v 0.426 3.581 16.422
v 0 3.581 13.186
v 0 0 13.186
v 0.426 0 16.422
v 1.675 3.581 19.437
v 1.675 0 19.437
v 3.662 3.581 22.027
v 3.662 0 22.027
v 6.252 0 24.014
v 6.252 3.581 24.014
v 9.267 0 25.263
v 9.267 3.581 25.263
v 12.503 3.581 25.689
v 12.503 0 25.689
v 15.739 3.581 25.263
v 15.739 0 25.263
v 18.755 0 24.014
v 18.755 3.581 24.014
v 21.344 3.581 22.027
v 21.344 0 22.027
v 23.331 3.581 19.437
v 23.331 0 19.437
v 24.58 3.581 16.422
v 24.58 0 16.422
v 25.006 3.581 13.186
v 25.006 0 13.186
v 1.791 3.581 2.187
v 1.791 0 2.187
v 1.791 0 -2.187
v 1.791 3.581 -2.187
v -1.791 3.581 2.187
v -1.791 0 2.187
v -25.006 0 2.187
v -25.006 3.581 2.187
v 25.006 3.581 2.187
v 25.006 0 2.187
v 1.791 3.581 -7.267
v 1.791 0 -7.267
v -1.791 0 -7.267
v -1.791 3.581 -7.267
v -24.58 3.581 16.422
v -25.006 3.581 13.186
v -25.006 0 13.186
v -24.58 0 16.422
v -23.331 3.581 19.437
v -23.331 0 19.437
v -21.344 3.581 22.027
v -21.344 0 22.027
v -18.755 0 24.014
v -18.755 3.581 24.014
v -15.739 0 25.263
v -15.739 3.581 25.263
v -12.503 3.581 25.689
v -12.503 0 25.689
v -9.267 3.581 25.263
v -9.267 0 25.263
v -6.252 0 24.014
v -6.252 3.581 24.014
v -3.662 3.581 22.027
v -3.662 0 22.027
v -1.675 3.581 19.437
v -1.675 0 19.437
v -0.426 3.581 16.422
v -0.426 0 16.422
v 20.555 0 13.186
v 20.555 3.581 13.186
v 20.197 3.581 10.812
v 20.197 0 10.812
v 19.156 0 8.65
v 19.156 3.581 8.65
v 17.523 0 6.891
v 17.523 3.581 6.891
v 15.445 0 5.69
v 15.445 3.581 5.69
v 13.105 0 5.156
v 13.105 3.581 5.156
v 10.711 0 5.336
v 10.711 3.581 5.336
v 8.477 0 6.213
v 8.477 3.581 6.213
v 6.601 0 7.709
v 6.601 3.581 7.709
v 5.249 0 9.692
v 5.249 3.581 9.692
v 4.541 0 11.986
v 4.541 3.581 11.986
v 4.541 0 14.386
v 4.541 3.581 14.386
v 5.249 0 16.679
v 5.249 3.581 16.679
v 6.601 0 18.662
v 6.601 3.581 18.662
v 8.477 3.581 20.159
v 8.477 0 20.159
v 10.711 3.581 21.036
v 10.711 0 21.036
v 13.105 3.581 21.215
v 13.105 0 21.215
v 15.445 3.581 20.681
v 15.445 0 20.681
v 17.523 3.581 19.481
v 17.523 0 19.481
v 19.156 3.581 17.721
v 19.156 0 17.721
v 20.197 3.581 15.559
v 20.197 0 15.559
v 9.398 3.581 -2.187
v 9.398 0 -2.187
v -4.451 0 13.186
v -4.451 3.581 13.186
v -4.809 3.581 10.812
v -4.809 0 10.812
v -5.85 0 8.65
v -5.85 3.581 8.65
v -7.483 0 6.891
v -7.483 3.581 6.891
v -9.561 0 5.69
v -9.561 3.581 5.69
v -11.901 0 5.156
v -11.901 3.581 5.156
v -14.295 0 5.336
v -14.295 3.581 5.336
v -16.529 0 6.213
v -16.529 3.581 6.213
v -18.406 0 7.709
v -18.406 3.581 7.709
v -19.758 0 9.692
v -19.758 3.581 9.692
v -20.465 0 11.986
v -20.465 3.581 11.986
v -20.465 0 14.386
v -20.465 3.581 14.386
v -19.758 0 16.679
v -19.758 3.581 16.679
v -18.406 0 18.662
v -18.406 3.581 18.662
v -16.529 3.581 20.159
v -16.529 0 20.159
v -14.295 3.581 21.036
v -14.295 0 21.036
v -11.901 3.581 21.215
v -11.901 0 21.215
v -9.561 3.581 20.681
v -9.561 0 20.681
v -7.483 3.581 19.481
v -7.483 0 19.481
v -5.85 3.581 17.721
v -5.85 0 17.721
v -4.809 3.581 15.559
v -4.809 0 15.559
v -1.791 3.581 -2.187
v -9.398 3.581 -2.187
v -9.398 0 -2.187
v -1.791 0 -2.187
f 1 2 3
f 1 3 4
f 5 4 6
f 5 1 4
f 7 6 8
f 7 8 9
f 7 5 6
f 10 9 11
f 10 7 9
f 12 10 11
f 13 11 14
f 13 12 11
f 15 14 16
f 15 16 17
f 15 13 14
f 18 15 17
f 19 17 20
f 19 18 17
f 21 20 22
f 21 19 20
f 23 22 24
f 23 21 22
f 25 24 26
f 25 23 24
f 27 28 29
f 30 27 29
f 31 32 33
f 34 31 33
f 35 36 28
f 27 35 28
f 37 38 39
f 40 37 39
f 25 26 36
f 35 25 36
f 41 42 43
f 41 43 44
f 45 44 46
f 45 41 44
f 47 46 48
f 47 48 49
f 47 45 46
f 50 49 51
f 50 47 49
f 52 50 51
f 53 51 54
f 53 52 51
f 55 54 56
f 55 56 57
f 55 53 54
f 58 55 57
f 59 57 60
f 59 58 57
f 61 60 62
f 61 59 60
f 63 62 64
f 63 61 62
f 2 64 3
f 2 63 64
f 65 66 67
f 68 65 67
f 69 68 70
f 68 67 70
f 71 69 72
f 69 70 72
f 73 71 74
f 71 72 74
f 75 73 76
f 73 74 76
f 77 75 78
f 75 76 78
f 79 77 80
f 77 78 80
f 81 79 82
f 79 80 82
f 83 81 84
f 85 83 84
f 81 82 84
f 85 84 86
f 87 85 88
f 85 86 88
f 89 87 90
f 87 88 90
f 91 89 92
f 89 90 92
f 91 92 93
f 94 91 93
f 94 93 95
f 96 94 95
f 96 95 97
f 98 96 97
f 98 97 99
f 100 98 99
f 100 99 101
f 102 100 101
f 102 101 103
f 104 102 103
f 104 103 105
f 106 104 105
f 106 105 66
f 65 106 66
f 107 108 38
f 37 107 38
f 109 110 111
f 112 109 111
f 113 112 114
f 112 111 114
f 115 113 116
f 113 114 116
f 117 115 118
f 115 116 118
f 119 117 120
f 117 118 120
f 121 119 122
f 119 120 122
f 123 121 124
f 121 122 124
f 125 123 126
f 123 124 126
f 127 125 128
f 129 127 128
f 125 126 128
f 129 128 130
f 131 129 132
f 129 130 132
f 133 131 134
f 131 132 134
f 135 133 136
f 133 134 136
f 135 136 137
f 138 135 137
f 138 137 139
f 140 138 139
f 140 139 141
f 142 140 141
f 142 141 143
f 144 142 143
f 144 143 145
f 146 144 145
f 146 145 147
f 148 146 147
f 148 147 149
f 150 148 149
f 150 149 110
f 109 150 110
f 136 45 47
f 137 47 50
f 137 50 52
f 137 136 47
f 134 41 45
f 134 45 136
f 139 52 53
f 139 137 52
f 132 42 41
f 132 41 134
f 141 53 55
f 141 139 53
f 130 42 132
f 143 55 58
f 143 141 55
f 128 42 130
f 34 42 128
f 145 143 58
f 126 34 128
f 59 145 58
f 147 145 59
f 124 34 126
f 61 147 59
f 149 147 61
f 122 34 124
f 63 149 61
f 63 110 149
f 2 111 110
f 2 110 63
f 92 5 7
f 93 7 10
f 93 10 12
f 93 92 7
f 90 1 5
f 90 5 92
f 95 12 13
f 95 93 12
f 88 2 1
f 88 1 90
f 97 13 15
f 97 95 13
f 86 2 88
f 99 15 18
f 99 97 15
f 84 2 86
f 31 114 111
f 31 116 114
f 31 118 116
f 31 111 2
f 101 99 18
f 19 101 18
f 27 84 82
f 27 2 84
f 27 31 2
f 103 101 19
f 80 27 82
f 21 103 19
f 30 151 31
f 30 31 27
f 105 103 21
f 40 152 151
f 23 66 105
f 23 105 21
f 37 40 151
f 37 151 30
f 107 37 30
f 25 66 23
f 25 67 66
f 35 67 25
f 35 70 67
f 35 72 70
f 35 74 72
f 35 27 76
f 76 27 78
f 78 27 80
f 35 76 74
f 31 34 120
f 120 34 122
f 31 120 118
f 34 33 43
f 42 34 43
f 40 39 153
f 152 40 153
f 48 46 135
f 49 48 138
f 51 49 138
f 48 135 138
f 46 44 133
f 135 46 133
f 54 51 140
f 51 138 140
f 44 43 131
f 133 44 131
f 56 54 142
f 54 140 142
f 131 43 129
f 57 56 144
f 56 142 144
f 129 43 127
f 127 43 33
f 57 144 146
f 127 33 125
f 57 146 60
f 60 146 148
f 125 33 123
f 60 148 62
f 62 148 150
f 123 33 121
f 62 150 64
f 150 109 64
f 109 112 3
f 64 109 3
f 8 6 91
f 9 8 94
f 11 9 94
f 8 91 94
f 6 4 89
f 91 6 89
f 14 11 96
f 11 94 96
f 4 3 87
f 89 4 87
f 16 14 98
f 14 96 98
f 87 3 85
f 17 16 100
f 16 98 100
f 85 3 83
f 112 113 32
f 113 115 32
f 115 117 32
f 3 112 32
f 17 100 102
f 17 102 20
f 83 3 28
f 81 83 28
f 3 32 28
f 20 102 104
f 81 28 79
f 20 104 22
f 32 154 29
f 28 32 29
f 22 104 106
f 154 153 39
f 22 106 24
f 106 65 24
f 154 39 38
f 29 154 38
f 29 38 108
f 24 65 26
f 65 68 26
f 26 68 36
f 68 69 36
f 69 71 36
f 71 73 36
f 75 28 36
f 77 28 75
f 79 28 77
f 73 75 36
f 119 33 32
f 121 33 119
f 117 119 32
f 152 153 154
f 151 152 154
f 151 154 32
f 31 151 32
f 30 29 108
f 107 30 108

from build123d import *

# Parameters (mm, degrees)
BOSS_EXTRUDE1_DEPTH = 3.5814
BOSS_EXTRUDE2_DEPTH = 3.5814
SKETCH4_R           = 8.0518
CUT_EXTRUDE2_DEPTH  = 4.5814


with BuildPart() as part:
    # Sketch1 → Boss-Extrude1 (new body)
    with BuildSketch(Plane(origin=(0, 0, 0), x_dir=(1, 0, 0), z_dir=(0, 1, 0))):
        Polygon((-25.0063, -13.1856988), (25.0063, -13.1856988), (25.0063, -2.1874988), (1.7907, -2.1874988), (1.7907, 2.1874988), (9.398, 2.1874988), (1.7907, 7.2674988), (-1.7907, 7.2674988), (-9.398, 2.1874988), (-1.7907, 2.1874988), (-1.7907, -2.1874988), (-25.0063, -2.1874988), align=None)
    extrude(amount=BOSS_EXTRUDE1_DEPTH)

    # Sketch3 → Boss-Extrude2 (add)
    with BuildSketch(Plane(origin=(0, 3.5814, 0), x_dir=(1, 0, 0), z_dir=(0, 1, 0))):
        with BuildLine():
            Line((0, -13.1856988), (-25.0063, -13.1856988))
            ThreePointArc((-25.0063, -13.1856988), (-12.50315, -25.6888488), (0, -13.1856988))
        make_face()
        with BuildLine():
            Line((25.0063, -13.1856988), (0, -13.1856988))
            ThreePointArc((0, -13.1856988), (12.50315, -25.6888488), (25.0063, -13.1856988))
        make_face()
    extrude(amount=-BOSS_EXTRUDE2_DEPTH)

    # Sketch4 → Cut-Extrude2 (cut, through all)
    with BuildSketch(Plane(origin=(0, 3.5814, 0), x_dir=(1, 0, 0), z_dir=(0, 1, 0))):
        with Locations((-12.50315, -13.1856988)):
            Circle(SKETCH4_R)
        with Locations((12.50315, -13.1856988)):
            Circle(SKETCH4_R)
    extrude(amount=-CUT_EXTRUDE2_DEPTH, mode=Mode.SUBTRACT)


solid = part.part
